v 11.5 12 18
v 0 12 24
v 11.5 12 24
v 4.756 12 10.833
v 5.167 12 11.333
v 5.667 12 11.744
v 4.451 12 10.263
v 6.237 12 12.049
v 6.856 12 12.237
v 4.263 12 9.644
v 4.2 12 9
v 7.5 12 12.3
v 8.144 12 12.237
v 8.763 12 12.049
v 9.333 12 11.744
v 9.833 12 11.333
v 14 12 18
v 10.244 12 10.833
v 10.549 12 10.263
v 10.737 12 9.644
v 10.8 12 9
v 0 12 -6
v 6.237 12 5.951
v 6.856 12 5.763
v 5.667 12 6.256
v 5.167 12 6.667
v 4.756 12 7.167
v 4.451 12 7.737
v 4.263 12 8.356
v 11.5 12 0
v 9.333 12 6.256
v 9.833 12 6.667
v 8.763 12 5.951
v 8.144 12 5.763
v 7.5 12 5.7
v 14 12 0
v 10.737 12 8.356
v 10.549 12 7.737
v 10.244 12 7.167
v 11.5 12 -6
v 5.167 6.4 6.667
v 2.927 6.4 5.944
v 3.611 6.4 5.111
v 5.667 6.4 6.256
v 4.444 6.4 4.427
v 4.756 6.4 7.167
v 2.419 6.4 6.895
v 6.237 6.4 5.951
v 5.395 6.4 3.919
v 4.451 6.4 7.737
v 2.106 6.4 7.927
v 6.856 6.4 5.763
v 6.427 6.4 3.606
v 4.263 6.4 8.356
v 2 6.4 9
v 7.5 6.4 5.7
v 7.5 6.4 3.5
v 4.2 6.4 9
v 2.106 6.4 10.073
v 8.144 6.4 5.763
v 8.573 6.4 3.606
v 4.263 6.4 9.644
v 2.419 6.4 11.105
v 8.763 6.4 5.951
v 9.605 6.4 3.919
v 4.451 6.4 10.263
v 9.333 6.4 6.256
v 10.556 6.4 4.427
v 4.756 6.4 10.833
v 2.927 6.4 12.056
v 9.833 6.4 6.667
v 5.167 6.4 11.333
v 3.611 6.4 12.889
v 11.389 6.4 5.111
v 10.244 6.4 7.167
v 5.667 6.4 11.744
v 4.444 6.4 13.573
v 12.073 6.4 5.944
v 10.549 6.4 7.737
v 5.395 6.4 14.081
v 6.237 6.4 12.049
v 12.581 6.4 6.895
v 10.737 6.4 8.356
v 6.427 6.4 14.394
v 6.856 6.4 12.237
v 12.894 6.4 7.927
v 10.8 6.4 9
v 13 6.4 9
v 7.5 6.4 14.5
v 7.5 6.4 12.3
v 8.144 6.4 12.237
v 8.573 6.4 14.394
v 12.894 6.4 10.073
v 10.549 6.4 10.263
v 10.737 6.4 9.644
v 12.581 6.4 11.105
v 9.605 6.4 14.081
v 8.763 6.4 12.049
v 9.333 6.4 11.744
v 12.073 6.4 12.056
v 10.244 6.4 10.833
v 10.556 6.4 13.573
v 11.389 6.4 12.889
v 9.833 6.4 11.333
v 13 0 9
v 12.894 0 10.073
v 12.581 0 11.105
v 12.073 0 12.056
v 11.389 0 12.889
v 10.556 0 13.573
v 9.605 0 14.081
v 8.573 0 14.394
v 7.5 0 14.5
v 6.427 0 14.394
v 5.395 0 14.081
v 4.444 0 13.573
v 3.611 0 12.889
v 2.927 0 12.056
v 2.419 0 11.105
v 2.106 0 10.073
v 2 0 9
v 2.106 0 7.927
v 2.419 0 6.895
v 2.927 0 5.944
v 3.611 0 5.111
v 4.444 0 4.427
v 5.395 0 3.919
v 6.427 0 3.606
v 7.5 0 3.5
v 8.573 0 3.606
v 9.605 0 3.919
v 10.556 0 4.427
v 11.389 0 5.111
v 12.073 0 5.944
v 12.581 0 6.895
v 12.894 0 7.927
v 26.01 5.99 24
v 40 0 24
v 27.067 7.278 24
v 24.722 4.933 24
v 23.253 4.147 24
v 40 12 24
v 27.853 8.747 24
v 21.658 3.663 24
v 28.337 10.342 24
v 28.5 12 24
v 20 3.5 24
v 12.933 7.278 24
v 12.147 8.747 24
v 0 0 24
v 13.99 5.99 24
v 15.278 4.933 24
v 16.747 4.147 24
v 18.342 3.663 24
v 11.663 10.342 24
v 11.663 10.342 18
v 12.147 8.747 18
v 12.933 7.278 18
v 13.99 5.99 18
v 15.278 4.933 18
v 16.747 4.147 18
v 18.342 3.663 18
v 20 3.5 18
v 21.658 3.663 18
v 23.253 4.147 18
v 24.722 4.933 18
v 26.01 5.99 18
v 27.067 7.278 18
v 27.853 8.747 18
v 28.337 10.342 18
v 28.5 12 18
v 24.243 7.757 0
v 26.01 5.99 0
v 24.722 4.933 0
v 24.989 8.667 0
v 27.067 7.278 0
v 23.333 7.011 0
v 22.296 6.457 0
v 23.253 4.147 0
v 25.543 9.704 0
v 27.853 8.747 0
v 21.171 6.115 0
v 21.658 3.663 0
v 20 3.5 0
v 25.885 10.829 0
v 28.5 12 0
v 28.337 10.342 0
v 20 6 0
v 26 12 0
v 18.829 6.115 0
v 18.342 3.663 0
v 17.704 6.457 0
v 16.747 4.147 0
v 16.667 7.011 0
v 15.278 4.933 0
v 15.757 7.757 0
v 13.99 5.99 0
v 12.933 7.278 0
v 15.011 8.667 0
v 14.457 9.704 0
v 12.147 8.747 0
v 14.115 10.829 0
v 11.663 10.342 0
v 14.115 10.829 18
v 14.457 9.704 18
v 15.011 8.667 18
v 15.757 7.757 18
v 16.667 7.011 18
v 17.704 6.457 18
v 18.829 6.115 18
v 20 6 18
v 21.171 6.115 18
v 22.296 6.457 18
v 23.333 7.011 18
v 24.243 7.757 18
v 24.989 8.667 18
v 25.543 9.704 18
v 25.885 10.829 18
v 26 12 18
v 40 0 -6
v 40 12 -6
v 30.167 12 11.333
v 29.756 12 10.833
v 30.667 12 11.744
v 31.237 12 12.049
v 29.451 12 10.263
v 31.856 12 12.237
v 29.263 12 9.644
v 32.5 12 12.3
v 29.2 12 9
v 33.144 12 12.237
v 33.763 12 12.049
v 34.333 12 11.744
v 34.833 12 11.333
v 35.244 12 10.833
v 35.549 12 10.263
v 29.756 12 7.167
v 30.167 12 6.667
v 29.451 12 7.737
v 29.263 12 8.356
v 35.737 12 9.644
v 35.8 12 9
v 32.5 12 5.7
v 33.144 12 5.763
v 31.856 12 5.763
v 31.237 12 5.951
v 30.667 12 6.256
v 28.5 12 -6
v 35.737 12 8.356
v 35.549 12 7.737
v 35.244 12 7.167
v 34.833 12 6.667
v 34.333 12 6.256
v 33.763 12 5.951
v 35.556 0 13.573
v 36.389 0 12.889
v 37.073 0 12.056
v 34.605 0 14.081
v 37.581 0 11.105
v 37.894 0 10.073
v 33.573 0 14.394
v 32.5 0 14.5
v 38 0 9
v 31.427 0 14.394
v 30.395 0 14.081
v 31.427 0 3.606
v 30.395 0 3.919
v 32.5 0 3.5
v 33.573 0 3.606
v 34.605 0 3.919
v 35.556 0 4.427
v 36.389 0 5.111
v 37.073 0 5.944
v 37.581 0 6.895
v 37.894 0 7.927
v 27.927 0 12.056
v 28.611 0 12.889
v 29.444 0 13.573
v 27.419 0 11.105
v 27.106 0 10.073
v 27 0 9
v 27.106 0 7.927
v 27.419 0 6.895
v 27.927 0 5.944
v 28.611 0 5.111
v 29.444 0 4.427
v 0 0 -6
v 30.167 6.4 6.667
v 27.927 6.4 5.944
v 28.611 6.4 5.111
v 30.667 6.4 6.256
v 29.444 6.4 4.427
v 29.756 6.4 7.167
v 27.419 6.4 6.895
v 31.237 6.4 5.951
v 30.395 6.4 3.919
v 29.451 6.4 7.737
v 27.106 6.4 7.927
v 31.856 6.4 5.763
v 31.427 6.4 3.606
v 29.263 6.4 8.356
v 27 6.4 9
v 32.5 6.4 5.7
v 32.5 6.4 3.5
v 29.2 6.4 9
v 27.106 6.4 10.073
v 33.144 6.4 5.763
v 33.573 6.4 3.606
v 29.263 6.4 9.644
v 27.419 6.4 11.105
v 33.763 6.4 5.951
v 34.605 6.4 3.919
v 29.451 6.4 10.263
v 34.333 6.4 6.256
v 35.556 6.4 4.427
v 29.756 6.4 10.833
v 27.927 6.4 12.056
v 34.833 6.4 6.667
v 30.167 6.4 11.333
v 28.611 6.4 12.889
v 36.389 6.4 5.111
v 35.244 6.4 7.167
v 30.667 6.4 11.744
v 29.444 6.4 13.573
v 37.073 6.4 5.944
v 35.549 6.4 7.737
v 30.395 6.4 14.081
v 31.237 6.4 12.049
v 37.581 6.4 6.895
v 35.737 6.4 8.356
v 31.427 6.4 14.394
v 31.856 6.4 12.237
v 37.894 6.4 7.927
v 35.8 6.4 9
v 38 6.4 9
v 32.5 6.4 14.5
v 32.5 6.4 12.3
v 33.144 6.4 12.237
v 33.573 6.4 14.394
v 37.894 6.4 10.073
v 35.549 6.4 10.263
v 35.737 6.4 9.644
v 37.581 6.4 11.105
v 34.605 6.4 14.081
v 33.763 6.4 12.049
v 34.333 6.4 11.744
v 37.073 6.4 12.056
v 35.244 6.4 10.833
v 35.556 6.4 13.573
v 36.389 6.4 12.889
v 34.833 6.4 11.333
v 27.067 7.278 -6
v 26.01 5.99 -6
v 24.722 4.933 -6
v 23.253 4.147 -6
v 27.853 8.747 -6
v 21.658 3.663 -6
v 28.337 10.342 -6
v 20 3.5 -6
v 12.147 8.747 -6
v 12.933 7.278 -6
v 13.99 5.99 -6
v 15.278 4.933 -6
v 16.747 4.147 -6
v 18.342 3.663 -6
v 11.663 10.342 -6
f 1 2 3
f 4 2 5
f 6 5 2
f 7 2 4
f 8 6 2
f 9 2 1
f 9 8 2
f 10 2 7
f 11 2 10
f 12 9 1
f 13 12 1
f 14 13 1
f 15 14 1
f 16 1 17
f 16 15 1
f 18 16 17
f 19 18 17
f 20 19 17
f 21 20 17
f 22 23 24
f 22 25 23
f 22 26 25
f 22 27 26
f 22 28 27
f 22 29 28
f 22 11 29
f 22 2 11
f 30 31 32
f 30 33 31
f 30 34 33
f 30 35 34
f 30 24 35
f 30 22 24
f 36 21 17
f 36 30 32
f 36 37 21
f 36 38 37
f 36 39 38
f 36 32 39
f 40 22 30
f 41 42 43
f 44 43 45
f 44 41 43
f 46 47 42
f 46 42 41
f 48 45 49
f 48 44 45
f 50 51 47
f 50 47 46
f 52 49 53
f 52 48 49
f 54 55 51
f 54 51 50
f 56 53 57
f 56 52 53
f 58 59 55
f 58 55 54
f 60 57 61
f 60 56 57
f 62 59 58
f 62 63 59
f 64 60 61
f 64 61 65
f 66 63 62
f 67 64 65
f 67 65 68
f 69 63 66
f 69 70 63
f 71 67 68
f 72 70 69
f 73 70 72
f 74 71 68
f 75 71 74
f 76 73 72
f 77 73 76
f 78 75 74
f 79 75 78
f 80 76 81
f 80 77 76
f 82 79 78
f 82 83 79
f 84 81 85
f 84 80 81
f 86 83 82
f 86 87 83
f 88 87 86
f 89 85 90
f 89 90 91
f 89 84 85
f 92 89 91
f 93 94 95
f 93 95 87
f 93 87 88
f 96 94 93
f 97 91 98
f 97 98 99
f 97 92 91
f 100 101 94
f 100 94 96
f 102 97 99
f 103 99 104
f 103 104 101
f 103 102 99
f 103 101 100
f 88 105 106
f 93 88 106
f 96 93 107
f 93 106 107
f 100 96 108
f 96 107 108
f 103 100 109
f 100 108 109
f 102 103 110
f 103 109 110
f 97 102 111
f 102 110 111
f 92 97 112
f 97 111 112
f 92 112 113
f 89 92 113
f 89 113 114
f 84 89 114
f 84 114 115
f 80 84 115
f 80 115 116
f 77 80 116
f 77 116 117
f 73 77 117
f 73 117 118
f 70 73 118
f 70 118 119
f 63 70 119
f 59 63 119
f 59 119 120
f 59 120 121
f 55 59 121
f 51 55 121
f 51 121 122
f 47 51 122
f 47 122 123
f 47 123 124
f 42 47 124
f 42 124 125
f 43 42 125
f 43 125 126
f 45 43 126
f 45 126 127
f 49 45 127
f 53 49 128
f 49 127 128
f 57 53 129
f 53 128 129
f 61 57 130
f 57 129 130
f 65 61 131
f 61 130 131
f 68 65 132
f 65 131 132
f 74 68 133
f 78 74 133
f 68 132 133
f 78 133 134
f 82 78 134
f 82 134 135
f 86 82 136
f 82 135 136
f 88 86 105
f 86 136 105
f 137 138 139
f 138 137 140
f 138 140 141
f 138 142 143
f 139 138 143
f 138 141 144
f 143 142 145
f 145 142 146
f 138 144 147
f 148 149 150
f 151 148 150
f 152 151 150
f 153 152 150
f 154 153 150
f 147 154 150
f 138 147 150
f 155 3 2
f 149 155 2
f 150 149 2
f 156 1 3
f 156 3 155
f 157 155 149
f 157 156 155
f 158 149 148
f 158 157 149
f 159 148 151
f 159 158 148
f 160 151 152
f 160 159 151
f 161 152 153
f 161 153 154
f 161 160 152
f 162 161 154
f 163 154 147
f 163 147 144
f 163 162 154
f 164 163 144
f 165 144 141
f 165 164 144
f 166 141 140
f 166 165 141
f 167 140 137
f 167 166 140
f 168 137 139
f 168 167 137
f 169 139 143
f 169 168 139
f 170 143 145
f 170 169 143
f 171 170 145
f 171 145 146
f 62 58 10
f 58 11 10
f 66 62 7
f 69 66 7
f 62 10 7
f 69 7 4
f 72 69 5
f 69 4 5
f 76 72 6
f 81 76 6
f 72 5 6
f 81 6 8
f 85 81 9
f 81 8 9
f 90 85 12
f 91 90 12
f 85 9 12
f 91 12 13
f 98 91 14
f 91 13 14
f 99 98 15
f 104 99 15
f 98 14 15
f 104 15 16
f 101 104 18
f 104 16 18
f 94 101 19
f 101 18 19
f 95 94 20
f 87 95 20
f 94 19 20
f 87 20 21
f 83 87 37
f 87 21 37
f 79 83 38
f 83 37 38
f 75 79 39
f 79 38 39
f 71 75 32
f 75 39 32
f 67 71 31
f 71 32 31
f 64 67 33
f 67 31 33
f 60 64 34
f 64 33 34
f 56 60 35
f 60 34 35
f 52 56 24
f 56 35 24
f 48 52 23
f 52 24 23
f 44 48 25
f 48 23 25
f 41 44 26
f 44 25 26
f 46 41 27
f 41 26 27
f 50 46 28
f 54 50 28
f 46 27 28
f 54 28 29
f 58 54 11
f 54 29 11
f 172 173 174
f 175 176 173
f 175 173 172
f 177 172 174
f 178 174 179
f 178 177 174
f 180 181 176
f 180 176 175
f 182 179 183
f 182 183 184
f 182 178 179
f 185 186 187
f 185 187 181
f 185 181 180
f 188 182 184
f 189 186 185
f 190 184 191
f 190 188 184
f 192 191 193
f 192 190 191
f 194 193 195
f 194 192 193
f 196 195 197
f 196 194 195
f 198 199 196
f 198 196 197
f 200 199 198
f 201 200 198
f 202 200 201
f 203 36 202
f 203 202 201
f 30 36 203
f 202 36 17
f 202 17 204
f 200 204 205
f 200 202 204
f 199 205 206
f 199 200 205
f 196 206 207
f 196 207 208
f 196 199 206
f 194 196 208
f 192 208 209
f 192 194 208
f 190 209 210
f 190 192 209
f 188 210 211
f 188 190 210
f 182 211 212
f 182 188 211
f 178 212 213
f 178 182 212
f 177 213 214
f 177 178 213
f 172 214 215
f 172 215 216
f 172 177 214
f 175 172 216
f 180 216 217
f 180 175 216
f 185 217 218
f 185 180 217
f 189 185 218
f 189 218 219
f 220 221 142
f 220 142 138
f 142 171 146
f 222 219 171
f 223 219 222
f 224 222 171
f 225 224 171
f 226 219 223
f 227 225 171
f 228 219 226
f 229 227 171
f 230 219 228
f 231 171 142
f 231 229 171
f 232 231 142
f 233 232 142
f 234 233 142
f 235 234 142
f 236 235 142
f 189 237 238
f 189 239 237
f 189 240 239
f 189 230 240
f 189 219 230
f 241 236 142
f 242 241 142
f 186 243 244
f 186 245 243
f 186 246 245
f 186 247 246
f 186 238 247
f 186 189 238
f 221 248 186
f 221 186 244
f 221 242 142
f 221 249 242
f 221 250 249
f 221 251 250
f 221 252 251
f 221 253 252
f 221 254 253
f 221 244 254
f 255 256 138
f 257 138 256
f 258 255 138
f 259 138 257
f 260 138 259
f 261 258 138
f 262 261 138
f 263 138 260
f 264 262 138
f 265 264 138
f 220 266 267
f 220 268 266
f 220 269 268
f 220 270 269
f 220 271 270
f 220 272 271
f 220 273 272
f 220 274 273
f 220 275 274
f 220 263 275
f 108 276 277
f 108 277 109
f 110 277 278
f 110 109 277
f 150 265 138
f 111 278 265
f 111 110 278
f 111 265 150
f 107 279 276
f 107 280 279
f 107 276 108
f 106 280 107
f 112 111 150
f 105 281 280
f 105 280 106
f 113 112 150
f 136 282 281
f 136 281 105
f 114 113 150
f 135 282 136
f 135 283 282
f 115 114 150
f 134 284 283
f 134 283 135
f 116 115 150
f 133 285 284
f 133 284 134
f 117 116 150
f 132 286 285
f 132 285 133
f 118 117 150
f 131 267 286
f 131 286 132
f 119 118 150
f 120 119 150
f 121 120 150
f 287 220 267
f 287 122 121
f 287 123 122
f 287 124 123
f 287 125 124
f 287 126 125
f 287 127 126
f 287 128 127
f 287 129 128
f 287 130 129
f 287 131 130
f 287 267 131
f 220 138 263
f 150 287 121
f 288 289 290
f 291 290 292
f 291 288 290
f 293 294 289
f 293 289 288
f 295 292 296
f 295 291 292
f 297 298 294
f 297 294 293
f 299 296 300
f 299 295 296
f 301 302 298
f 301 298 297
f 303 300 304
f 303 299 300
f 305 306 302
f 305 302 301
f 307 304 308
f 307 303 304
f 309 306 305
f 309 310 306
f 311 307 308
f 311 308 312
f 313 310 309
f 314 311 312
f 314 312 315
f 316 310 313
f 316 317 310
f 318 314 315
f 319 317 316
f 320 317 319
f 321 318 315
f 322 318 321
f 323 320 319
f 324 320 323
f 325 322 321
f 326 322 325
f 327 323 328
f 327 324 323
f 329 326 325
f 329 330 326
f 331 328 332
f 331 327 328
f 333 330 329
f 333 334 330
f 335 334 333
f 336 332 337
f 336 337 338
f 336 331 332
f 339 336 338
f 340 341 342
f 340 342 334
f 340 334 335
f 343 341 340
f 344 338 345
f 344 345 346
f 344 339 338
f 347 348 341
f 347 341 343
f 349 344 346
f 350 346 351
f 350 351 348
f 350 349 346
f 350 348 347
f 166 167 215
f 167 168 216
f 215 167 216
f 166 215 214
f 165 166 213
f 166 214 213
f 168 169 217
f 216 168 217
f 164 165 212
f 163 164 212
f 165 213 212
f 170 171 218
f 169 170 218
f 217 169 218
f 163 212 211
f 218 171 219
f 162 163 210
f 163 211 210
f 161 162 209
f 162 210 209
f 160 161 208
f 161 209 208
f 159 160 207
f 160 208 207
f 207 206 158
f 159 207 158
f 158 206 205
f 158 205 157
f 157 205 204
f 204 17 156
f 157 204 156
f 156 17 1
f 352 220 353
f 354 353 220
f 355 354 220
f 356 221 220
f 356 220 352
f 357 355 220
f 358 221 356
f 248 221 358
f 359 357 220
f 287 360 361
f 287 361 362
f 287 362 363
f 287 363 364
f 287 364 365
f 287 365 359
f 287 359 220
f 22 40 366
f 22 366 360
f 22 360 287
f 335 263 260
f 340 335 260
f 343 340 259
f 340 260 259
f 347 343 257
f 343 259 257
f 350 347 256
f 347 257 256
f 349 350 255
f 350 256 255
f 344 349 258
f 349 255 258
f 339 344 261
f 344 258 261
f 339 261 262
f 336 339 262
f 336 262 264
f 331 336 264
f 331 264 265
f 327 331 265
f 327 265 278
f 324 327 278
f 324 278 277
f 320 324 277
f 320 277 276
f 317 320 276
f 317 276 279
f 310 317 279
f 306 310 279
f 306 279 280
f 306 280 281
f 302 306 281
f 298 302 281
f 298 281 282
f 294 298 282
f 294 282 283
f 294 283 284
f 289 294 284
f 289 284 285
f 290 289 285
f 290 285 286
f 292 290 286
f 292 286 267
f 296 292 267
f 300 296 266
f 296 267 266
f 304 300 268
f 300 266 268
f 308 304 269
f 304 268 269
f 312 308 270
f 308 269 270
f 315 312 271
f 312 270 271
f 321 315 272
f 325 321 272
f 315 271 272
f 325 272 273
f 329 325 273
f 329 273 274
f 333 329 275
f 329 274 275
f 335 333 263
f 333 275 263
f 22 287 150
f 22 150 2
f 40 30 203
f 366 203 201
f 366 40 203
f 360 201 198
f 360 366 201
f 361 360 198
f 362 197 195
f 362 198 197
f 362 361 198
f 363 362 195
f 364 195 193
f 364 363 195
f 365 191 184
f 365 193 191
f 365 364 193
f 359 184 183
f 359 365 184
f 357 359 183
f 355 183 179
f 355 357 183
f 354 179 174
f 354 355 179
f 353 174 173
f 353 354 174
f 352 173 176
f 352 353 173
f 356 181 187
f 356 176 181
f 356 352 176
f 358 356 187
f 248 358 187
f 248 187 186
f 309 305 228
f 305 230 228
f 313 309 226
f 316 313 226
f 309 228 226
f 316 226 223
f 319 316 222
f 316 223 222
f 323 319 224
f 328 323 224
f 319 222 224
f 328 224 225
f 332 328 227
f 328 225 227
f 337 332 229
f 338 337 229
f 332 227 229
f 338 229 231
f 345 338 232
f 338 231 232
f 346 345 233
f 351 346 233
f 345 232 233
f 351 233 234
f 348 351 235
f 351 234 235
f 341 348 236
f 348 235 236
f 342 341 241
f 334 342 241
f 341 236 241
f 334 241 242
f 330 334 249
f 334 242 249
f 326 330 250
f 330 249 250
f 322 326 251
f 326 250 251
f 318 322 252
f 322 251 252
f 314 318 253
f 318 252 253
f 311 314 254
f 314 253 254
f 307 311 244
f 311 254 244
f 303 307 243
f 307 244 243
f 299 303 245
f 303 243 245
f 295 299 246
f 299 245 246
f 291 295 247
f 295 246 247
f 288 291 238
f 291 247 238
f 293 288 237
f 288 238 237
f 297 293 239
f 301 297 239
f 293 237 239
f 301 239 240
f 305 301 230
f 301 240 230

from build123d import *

# Parameters (mm, degrees)
EXTRUDE_1_DEPTH             = 24
EXTRUDE_1_DEPTH_BACK        = 6
EXTRUDE_2_DEPTH             = 18
HOLE_WIZARD_M61_D           = 6.6
HOLE_WIZARD_M61_CBORE_D     = 11
HOLE_WIZARD_M61_CBORE_DEPTH = 6.4


with BuildPart() as part:
    # Эскиз1 → Бобышка-Вытянуть1 (new, two sides: drawn at the far end of the back side and taken through both)
    with BuildSketch(Plane.XY.offset(-EXTRUDE_1_DEPTH_BACK)):
        with BuildLine():
            Line((28.5, 12), (40, 12))
            Line((40, 12), (40, 0))
            Line((40, 0), (0, 0))
            Line((0, 0), (0, 12))
            Line((0, 12), (11.5, 12))
            ThreePointArc((11.5, 12), (20, 3.5), (28.5, 12))
        make_face()
    extrude(amount=EXTRUDE_1_DEPTH + EXTRUDE_1_DEPTH_BACK)

    # Эскиз3 → Бобышка-Вытянуть2 (add)
    with BuildSketch(Plane.XY):
        with BuildLine():
            Line((11.5, 12), (14, 12))
            ThreePointArc((14, 12), (20, 6), (26, 12))
            Line((26, 12), (28.5, 12))
            ThreePointArc((28.5, 12), (20, 3.5), (11.5, 12))
        make_face()
    extrude(amount=EXTRUDE_2_DEPTH)

    # Цековка для  винта с внутренним шестигранником M61 (through all)
    with Locations(Plane.XZ):
        with Locations((7.5, 9), (32.5, 9)):
            CounterBoreHole(HOLE_WIZARD_M61_D / 2, HOLE_WIZARD_M61_CBORE_D / 2, HOLE_WIZARD_M61_CBORE_DEPTH)


solid = part.part
